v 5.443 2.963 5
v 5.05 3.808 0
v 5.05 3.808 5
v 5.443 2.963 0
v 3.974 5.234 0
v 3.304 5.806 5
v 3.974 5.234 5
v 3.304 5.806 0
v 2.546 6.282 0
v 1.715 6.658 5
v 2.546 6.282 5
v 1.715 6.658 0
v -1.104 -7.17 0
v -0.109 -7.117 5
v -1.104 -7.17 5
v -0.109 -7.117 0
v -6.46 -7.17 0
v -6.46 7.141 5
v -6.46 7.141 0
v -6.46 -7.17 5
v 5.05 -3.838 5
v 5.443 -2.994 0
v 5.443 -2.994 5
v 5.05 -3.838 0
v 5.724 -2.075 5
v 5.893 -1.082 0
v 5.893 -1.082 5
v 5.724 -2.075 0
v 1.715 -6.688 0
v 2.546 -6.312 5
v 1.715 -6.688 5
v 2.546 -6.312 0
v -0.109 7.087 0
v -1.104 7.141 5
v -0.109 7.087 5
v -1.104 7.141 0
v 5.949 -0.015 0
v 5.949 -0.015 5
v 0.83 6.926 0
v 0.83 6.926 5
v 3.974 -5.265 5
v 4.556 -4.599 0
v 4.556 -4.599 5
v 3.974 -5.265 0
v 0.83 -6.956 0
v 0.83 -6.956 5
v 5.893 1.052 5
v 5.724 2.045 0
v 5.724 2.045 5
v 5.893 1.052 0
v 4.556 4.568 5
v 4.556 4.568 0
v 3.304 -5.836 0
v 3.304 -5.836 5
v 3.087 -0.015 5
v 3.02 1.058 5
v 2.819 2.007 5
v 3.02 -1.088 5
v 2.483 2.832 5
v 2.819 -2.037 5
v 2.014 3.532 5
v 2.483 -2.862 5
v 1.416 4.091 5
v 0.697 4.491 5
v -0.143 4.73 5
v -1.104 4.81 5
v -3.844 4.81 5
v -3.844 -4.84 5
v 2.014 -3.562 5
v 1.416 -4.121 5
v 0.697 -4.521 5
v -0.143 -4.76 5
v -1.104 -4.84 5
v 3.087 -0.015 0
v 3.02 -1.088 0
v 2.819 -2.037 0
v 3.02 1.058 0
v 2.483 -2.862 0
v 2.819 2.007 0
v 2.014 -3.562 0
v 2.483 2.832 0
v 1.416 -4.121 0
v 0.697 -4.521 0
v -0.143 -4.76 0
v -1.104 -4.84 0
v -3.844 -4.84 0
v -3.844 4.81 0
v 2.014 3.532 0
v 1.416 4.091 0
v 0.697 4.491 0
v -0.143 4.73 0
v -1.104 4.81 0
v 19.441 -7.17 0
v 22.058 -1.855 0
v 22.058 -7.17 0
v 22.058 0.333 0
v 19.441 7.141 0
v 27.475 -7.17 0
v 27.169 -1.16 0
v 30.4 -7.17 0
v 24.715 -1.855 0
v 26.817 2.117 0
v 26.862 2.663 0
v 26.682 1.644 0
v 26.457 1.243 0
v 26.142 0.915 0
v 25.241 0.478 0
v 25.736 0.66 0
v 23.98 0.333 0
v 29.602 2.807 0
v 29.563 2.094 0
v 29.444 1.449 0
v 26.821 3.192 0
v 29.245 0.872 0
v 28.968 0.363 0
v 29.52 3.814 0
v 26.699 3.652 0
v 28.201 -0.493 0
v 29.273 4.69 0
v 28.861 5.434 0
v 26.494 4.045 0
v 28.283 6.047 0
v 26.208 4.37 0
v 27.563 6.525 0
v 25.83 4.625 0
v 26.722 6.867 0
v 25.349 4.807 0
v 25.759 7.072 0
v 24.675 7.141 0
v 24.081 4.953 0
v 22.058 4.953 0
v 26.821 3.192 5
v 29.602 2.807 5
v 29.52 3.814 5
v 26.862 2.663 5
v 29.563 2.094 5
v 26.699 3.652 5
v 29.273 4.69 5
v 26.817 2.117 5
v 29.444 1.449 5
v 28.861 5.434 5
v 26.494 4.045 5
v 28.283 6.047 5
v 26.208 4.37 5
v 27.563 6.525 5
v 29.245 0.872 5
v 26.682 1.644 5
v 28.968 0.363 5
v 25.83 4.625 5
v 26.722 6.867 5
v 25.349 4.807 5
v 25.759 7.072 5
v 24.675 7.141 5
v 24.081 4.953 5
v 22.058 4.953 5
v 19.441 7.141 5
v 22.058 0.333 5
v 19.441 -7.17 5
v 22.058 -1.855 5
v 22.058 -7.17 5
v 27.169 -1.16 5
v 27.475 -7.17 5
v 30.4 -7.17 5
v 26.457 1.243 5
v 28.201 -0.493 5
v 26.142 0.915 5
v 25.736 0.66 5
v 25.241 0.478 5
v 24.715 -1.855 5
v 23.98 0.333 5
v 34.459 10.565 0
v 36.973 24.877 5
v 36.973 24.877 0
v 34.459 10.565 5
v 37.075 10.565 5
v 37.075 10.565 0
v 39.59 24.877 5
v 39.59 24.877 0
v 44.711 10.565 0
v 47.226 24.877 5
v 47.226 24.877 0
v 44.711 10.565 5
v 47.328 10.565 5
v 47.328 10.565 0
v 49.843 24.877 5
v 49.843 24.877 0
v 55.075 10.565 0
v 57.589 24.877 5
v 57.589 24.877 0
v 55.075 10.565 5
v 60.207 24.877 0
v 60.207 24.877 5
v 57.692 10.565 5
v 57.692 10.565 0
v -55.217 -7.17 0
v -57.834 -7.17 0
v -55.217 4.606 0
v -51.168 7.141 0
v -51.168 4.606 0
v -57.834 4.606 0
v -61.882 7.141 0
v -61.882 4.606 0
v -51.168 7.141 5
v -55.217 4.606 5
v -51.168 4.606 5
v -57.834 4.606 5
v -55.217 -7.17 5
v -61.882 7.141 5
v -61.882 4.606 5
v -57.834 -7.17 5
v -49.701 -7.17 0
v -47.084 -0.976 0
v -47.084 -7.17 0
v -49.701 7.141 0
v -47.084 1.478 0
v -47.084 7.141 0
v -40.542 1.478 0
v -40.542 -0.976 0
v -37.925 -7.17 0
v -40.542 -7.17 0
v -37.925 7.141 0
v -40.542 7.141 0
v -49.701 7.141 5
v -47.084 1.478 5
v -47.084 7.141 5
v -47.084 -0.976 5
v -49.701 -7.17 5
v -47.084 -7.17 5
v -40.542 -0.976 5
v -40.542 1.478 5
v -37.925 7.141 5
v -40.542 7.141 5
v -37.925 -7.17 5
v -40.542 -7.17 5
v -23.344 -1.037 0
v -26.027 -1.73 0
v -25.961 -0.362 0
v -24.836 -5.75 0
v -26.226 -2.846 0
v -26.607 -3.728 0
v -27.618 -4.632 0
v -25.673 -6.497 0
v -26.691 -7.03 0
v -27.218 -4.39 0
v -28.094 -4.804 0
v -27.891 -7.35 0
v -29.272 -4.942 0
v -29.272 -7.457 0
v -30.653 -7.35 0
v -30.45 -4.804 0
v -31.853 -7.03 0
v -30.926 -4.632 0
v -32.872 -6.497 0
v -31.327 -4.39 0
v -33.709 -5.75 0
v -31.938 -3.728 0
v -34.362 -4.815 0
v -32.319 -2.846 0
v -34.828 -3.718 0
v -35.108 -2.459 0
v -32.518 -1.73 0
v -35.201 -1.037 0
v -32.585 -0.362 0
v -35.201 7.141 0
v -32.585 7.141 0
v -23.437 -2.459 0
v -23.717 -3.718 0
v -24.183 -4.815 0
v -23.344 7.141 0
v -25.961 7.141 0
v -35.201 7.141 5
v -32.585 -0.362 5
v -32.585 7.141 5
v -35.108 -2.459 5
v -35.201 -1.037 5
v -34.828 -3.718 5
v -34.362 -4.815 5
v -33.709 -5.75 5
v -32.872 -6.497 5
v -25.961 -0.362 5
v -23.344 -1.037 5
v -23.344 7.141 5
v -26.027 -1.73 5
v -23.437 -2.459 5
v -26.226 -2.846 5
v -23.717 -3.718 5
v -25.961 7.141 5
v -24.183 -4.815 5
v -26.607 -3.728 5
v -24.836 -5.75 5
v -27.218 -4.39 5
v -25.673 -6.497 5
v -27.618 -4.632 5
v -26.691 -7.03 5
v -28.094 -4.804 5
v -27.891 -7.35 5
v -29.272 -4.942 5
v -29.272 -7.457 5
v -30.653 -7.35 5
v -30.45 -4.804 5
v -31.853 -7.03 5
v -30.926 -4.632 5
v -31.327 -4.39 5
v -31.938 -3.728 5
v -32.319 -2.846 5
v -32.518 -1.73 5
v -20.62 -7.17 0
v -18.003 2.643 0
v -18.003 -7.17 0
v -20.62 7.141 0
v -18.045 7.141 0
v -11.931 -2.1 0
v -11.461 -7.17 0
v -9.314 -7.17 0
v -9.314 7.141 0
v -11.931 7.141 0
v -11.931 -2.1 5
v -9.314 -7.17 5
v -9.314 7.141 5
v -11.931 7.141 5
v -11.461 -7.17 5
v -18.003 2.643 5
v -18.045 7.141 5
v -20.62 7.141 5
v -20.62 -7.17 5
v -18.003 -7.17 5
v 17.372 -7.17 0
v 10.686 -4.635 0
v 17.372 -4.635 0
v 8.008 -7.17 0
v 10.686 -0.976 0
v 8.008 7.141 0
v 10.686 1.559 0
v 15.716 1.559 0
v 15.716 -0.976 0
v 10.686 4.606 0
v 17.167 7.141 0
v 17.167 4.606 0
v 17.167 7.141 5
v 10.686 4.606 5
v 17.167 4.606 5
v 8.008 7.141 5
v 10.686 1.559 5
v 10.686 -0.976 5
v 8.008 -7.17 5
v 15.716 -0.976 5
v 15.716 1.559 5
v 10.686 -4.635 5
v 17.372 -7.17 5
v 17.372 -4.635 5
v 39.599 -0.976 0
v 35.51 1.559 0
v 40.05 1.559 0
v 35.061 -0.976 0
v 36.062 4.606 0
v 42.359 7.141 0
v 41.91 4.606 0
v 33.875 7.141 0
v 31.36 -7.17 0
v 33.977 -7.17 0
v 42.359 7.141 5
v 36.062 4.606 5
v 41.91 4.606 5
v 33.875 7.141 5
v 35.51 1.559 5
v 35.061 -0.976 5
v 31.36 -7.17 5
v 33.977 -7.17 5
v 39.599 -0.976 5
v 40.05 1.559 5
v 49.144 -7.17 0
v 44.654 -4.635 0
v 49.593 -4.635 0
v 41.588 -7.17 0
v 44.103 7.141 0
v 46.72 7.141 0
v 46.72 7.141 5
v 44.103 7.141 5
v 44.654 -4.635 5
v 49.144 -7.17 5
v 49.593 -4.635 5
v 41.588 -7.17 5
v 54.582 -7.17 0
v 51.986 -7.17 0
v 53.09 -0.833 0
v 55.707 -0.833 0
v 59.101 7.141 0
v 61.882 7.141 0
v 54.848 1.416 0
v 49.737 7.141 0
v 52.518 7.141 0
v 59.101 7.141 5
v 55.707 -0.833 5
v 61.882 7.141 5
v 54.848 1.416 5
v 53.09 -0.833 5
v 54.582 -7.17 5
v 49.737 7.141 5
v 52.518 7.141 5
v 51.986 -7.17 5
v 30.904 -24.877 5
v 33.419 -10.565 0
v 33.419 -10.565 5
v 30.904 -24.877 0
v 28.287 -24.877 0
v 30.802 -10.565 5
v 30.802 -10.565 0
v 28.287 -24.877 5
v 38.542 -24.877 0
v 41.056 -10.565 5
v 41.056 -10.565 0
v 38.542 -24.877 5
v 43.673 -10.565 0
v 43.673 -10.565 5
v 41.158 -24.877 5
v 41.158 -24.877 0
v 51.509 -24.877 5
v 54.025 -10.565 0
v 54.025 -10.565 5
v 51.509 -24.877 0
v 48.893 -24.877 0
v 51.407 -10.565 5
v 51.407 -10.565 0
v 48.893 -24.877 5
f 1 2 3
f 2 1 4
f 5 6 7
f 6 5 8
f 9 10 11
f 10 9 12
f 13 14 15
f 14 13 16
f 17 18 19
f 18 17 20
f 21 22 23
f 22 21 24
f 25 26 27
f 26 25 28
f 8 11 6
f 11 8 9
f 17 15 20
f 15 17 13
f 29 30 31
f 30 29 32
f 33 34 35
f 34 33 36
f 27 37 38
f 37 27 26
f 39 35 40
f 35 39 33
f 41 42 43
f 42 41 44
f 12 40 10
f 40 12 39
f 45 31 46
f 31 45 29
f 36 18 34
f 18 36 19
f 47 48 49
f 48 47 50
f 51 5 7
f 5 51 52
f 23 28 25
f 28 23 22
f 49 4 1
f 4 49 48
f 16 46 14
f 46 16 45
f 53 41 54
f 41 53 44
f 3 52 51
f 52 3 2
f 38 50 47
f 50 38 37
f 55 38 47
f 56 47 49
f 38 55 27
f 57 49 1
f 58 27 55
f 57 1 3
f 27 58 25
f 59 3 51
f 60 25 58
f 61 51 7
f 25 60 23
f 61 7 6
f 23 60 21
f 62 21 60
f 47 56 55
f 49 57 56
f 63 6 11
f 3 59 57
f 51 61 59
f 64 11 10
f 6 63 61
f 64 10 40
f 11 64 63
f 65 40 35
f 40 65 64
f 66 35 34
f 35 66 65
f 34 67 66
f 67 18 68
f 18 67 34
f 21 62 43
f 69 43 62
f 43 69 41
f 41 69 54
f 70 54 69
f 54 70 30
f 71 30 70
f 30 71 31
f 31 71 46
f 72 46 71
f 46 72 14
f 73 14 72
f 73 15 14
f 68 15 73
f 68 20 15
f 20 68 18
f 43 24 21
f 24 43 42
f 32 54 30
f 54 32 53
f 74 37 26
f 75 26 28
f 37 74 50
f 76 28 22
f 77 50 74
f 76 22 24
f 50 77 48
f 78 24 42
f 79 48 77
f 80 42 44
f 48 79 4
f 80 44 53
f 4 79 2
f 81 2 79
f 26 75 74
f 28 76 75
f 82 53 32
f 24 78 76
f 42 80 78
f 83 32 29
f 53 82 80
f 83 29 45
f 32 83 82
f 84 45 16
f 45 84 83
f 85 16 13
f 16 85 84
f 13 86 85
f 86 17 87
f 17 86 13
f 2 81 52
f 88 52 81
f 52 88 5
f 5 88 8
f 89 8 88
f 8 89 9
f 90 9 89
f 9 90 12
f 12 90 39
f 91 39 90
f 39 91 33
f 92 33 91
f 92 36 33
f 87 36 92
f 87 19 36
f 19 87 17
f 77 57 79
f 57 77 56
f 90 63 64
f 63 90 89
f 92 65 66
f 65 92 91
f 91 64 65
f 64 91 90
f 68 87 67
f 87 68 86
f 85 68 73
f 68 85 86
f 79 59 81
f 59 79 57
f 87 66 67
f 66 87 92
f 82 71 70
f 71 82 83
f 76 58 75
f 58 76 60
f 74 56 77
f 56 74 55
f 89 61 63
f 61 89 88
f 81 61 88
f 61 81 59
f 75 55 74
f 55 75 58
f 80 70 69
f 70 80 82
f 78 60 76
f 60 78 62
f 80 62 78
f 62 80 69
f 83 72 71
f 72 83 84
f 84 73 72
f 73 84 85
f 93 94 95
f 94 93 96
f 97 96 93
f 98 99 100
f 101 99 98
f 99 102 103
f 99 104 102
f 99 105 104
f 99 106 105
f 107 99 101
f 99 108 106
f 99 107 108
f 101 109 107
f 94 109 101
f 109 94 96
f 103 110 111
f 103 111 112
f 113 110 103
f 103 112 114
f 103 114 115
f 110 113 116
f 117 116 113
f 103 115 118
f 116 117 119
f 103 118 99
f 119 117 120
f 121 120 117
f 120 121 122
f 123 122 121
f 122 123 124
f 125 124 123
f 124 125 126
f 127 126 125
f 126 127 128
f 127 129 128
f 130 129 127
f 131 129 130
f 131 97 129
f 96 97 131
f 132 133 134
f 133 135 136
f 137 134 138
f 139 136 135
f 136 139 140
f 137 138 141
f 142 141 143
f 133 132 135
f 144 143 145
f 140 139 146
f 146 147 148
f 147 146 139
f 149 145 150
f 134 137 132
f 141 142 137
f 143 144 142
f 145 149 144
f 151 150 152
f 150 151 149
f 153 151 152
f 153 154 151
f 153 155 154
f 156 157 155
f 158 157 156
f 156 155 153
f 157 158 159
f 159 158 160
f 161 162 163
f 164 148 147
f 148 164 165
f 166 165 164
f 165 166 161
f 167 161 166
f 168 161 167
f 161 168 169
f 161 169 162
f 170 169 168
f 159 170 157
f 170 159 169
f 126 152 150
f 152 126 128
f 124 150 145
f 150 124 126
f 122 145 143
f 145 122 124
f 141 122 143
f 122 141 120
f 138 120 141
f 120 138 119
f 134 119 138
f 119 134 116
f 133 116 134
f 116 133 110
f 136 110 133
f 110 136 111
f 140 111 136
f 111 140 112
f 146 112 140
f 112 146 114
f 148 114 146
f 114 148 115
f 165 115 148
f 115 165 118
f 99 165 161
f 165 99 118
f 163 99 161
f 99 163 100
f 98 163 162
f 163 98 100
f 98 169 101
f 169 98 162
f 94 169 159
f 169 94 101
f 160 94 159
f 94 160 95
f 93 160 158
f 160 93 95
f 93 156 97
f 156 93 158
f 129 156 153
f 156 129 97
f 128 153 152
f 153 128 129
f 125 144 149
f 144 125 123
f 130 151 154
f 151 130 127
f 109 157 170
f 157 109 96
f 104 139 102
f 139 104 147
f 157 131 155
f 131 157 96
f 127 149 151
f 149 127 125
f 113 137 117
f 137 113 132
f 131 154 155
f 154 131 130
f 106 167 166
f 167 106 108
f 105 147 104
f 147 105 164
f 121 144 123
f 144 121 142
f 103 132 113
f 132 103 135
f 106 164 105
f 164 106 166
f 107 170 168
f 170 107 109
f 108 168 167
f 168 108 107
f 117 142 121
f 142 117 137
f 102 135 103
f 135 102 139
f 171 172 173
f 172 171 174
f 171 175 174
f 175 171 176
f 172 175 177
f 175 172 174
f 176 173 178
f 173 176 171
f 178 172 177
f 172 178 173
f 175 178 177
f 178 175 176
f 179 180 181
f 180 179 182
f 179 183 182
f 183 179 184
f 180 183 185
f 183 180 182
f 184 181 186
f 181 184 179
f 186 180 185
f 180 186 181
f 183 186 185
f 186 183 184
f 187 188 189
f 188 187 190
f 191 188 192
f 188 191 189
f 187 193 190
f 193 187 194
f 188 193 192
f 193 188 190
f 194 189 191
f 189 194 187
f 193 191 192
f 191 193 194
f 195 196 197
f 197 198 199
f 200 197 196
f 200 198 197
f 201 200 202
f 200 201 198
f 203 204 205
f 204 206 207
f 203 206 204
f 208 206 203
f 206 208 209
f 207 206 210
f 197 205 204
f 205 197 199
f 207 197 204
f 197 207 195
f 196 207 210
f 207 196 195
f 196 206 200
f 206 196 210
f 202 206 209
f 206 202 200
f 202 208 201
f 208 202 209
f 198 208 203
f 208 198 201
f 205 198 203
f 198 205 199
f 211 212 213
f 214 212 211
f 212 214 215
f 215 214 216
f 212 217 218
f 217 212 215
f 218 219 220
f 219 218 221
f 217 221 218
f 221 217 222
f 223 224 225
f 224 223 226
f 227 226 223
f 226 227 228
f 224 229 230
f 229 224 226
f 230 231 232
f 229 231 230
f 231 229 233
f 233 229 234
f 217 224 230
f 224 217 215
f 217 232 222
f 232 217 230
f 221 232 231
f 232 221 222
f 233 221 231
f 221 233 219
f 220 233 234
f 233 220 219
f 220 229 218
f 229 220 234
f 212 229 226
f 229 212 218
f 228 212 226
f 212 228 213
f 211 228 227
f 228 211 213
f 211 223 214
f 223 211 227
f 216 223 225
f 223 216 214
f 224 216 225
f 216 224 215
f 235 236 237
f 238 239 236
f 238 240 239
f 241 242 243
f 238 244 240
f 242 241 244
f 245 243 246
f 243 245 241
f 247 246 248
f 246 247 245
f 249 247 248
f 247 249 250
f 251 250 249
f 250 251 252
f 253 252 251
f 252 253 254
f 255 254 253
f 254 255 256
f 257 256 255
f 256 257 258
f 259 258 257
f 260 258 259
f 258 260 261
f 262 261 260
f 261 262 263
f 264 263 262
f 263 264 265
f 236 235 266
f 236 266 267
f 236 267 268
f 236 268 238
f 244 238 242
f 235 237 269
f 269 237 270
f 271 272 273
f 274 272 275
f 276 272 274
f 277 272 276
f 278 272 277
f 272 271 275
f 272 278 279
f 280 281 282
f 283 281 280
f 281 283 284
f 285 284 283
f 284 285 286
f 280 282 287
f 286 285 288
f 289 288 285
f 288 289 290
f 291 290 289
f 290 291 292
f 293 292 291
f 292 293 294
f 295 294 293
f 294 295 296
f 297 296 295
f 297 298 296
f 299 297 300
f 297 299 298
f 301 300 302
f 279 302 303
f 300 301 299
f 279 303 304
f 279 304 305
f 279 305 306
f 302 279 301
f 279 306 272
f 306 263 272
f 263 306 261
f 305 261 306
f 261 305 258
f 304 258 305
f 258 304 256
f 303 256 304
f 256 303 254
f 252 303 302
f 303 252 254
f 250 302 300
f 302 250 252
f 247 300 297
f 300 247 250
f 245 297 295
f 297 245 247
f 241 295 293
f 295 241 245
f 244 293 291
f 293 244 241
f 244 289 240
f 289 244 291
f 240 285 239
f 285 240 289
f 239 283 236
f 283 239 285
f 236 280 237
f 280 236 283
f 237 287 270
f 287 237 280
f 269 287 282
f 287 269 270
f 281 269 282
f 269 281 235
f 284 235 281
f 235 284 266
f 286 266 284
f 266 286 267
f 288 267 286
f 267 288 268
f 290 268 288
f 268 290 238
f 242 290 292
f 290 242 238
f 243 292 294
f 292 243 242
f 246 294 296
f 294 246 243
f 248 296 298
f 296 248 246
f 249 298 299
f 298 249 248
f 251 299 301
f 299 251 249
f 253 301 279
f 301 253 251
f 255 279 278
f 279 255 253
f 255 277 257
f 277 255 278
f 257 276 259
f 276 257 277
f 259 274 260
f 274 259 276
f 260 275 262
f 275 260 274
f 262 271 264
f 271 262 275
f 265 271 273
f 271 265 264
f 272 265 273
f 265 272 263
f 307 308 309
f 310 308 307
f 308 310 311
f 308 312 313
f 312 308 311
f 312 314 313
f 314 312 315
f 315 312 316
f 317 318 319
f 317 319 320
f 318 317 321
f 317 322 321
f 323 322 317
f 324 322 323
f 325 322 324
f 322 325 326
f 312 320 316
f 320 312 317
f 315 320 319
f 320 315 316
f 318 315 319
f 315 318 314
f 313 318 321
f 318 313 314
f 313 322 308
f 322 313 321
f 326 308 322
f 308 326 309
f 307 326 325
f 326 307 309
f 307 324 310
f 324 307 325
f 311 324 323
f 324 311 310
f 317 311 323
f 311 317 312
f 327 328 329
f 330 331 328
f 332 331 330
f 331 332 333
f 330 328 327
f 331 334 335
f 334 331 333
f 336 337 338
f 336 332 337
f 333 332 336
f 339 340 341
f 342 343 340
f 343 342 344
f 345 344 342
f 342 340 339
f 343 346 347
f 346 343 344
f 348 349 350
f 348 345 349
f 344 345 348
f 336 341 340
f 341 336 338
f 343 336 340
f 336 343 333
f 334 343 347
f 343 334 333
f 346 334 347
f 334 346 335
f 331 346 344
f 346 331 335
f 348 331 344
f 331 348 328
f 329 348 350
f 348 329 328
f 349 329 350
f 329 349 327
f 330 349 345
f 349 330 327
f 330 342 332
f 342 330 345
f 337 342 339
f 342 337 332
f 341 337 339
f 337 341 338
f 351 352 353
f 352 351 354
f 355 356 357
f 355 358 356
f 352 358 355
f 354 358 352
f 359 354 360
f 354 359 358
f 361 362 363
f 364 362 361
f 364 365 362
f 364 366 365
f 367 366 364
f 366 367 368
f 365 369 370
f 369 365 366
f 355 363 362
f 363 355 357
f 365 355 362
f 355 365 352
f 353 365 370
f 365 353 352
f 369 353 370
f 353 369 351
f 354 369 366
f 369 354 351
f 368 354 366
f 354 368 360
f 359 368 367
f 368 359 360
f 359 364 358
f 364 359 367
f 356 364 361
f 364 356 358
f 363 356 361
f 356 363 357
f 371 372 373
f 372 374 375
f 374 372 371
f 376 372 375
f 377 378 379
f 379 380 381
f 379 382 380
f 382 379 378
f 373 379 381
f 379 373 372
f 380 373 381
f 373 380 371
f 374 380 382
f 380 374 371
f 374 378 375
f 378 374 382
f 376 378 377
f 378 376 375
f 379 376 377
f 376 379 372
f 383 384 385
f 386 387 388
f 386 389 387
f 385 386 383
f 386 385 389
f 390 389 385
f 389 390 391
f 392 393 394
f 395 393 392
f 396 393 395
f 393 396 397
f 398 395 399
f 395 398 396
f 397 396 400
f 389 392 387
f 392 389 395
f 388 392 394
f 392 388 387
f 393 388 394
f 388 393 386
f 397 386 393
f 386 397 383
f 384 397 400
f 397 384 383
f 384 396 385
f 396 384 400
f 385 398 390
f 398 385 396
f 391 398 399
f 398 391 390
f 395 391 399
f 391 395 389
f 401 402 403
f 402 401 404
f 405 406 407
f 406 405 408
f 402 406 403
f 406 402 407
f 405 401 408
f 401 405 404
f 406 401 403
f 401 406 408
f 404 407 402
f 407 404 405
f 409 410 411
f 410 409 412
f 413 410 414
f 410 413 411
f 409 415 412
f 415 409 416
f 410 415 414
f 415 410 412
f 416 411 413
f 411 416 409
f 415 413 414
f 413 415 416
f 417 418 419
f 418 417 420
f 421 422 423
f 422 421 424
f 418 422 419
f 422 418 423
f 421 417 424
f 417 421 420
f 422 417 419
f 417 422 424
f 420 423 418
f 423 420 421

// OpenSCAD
// Module names are of the form poly_<inkscape-path-id>().  As a result,
// you can associate a polygon in this OpenSCAD program with the corresponding
// SVG element in the Inkscape document by looking for the XML element with
// the attribute id="inkscape-path-id".

// fudge value is used to ensure that subtracted solids are a tad taller
// in the z dimension than the polygon being subtracted from.  This helps
// keep the resulting .stl file manifold.
fudge = 0.1;

module TF_logo(h)
{
  scale([25.4/90, -25.4/90, 1]) union()
  {
    linear_extrude(height=h)
      polygon([[131.005856,-88.147459],[122.097656,-37.436522],[131.369136,-37.436522],[140.279296,-88.147459],[131.005856,-88.147459]]);
    linear_extrude(height=h)
      polygon([[167.335936,-88.147459],[158.423826,-37.436522],[167.697266,-37.436522],[176.607426,-88.147459],[167.335936,-88.147459]]);
    linear_extrude(height=h)
      polygon([[204.056636,-88.147459],[195.146486,-37.436522],[204.419926,-37.436522],[213.332026,-88.147459],[204.056636,-88.147459]]);
    linear_extrude(height=h)
      polygon([[-219.265626,-25.301756],[-219.265626,-16.319334],[-204.921876,-16.319334],[-204.921876,25.407229],[-195.650392,25.407229],[-195.650392,-16.319334],[-181.304688,-16.319334],[-181.304688,-25.301756],[-219.265626,-25.301756]]);
    linear_extrude(height=h)
      polygon([[-176.105470,-25.301756],[-176.105470,25.407229],[-166.833985,25.407229],[-166.833985,3.458009],[-143.652344,3.458009],[-143.652344,25.407229],[-134.378904,25.407229],[-134.378904,-25.301756],[-143.652344,-25.301756],[-143.652344,-5.235351],[-166.833985,-5.235351],[-166.833985,-25.301756],[-176.105470,-25.301756]]);
    linear_extrude(height=h)
      polygon([[-124.728514,-25.301756],[-124.728514,3.674809],[-124.398172,8.711791],[-123.407010,13.174165],[-121.754823,17.061666],[-119.441404,20.374029],[-116.475793,23.019739],[-112.866682,24.909363],[-108.614269,26.043038],[-103.718754,26.420899],[-98.825949,26.043038],[-94.575379,24.909363],[-90.966809,23.019739],[-88.000004,20.374029],[-85.688071,17.061666],[-84.036423,13.174165],[-83.045275,8.711791],[-82.714844,3.674809],[-82.714844,-25.301756],[-91.986334,-25.301756],[-91.986334,1.284179],[-92.221534,6.129124],[-92.927734,10.084959],[-94.276573,13.210014],[-96.441404,15.555669],[-97.860305,16.410877],[-99.546582,17.021852],[-103.718754,17.510739],[-107.894875,17.021852],[-109.581243,16.410877],[-111.000004,15.555669],[-113.165964,13.210014],[-114.515624,10.084959],[-115.221679,6.129124],[-115.457034,1.284179],[-115.457034,-25.301756],[-124.728514,-25.301756]]);
    linear_extrude(height=h)
      polygon([[-73.062504,-25.301756],[-73.062504,25.407229],[-63.791014,25.407229],[-63.791014,-9.364261],[-40.609374,25.407229],[-33.003904,25.407229],[-33.003904,-25.301756],[-42.275394,-25.301756],[-42.275394,7.442389],[-63.937504,-25.301756],[-73.062504,-25.301756]]);
    difference()
    {
       linear_extrude(height=h)
         polygon([[-22.890624,-25.301756],[-22.890624,25.407229],[-3.912114,25.407229],[-0.387604,25.217502],[2.942210,24.647872],[6.077772,23.697665],[9.019526,22.366209],[11.706254,20.677683],[14.080554,18.654102],[16.142601,16.295169],[17.892576,13.600589],[19.287247,10.607888],[20.283325,7.352149],[20.880904,3.833910],[21.080076,0.053709],[20.880904,-3.726901],[20.283325,-7.244726],[19.287247,-10.500051],[17.892576,-13.493161],[16.142601,-16.186583],[14.080554,-18.546051],[11.706254,-20.570969],[9.019526,-22.260740],[6.077772,-23.591461],[2.942210,-24.541748],[-0.387604,-25.111785],[-3.912114,-25.301756],[-22.890624,-25.301756]]);
       translate([0, 0, -fudge])
         linear_extrude(height=h+2*fudge)
           polygon([[-13.619144,-17.043943],[-3.912114,-17.043943],[-0.505286,-16.760764],[2.471329,-15.911521],[5.017942,-14.496654],[7.134766,-12.516601],[8.798563,-10.033097],[9.987612,-7.109996],[10.701411,-3.747620],[10.939456,0.053709],[10.701411,3.854493],[9.987612,7.216593],[8.798563,10.139341],[7.134766,12.622069],[5.017942,14.603644],[2.471329,16.018345],[-0.505286,16.866746],[-3.912114,17.149419],[-13.619144,17.149419],[-13.619144,-17.043943]]);
    }
    linear_extrude(height=h)
      polygon([[28.374996,-25.301756],[28.374996,25.407229],[61.554686,25.407229],[61.554686,16.424809],[37.865236,16.424809],[37.865236,3.458009],[55.685546,3.458009],[55.685546,-5.524411],[37.865236,-5.524411],[37.865236,-16.319334],[60.828126,-16.319334],[60.828126,-25.301756],[28.374996,-25.301756]]);
    difference()
    {
       linear_extrude(height=h)
         polygon([[68.884766,-25.301756],[68.884766,25.407229],[78.158206,25.407229],[78.158206,6.573239],[87.212886,6.573239],[87.574216,6.573239],[97.353516,25.407229],[107.714846,25.407229],[96.269526,4.110349],[99.926050,1.747262],[102.642576,-1.286131],[103.624959,-3.090474],[104.327601,-5.134931],[104.749743,-7.419538],[104.890626,-9.944331],[104.598528,-13.513936],[103.722211,-16.617745],[102.261645,-19.255453],[100.216796,-21.426756],[97.665122,-23.121787],[94.682741,-24.332756],[91.270611,-25.059475],[87.429686,-25.301756],[68.884766,-25.301756]]);
       translate([0, 0, -fudge])
         linear_extrude(height=h+2*fudge)
           polygon([[78.158206,-17.549803],[85.328126,-17.549803],[89.820201,-17.033776],[91.522972,-16.388646],[92.863276,-15.485350],[93.876895,-14.332807],[94.601456,-12.940636],[95.036517,-11.308614],[95.181636,-9.436521],[95.022061,-7.501251],[94.543318,-5.823956],[93.745379,-4.404654],[92.628217,-3.243365],[91.191806,-2.340107],[89.436116,-1.694900],[84.966796,-1.178711],[78.158206,-1.178711],[78.158206,-17.549803]]);
    }
    linear_extrude(height=h)
      polygon([[120.029296,-25.301756],[111.117186,25.407229],[120.390626,25.407229],[124.230466,3.458009],[140.312496,3.458009],[141.908206,-5.524411],[125.824216,-5.524411],[127.779296,-16.319334],[148.499996,-16.319334],[150.091796,-25.301756],[120.029296,-25.301756]]);
    linear_extrude(height=h)
      polygon([[156.269526,-25.301756],[147.357426,25.407229],[174.130856,25.407229],[175.724606,16.424809],[158.222656,16.424809],[165.542966,-25.301756],[156.269526,-25.301756]]);
    linear_extrude(height=h)
      polygon([[176.234376,-25.301756],[188.115236,2.952149],[184.203126,25.407229],[193.402346,25.407229],[197.388666,2.952149],[219.265626,-25.301756],[209.414066,-25.301756],[194.343746,-5.018551],[186.087886,-25.301756],[176.234376,-25.301756]]);
    linear_extrude(height=h)
      polygon([[109.140626,37.436529],[100.230466,88.147459],[109.501956,88.147459],[118.412106,37.436529],[109.140626,37.436529]]);
    linear_extrude(height=h)
      polygon([[145.474606,37.436529],[136.564456,88.147459],[145.835936,88.147459],[154.748046,37.436529],[145.474606,37.436529]]);
    linear_extrude(height=h)
      polygon([[182.152346,37.436529],[173.242186,88.147459],[182.513666,88.147459],[191.425776,37.436529],[182.152346,37.436529]]);
  }
}

TF_logo(5);
